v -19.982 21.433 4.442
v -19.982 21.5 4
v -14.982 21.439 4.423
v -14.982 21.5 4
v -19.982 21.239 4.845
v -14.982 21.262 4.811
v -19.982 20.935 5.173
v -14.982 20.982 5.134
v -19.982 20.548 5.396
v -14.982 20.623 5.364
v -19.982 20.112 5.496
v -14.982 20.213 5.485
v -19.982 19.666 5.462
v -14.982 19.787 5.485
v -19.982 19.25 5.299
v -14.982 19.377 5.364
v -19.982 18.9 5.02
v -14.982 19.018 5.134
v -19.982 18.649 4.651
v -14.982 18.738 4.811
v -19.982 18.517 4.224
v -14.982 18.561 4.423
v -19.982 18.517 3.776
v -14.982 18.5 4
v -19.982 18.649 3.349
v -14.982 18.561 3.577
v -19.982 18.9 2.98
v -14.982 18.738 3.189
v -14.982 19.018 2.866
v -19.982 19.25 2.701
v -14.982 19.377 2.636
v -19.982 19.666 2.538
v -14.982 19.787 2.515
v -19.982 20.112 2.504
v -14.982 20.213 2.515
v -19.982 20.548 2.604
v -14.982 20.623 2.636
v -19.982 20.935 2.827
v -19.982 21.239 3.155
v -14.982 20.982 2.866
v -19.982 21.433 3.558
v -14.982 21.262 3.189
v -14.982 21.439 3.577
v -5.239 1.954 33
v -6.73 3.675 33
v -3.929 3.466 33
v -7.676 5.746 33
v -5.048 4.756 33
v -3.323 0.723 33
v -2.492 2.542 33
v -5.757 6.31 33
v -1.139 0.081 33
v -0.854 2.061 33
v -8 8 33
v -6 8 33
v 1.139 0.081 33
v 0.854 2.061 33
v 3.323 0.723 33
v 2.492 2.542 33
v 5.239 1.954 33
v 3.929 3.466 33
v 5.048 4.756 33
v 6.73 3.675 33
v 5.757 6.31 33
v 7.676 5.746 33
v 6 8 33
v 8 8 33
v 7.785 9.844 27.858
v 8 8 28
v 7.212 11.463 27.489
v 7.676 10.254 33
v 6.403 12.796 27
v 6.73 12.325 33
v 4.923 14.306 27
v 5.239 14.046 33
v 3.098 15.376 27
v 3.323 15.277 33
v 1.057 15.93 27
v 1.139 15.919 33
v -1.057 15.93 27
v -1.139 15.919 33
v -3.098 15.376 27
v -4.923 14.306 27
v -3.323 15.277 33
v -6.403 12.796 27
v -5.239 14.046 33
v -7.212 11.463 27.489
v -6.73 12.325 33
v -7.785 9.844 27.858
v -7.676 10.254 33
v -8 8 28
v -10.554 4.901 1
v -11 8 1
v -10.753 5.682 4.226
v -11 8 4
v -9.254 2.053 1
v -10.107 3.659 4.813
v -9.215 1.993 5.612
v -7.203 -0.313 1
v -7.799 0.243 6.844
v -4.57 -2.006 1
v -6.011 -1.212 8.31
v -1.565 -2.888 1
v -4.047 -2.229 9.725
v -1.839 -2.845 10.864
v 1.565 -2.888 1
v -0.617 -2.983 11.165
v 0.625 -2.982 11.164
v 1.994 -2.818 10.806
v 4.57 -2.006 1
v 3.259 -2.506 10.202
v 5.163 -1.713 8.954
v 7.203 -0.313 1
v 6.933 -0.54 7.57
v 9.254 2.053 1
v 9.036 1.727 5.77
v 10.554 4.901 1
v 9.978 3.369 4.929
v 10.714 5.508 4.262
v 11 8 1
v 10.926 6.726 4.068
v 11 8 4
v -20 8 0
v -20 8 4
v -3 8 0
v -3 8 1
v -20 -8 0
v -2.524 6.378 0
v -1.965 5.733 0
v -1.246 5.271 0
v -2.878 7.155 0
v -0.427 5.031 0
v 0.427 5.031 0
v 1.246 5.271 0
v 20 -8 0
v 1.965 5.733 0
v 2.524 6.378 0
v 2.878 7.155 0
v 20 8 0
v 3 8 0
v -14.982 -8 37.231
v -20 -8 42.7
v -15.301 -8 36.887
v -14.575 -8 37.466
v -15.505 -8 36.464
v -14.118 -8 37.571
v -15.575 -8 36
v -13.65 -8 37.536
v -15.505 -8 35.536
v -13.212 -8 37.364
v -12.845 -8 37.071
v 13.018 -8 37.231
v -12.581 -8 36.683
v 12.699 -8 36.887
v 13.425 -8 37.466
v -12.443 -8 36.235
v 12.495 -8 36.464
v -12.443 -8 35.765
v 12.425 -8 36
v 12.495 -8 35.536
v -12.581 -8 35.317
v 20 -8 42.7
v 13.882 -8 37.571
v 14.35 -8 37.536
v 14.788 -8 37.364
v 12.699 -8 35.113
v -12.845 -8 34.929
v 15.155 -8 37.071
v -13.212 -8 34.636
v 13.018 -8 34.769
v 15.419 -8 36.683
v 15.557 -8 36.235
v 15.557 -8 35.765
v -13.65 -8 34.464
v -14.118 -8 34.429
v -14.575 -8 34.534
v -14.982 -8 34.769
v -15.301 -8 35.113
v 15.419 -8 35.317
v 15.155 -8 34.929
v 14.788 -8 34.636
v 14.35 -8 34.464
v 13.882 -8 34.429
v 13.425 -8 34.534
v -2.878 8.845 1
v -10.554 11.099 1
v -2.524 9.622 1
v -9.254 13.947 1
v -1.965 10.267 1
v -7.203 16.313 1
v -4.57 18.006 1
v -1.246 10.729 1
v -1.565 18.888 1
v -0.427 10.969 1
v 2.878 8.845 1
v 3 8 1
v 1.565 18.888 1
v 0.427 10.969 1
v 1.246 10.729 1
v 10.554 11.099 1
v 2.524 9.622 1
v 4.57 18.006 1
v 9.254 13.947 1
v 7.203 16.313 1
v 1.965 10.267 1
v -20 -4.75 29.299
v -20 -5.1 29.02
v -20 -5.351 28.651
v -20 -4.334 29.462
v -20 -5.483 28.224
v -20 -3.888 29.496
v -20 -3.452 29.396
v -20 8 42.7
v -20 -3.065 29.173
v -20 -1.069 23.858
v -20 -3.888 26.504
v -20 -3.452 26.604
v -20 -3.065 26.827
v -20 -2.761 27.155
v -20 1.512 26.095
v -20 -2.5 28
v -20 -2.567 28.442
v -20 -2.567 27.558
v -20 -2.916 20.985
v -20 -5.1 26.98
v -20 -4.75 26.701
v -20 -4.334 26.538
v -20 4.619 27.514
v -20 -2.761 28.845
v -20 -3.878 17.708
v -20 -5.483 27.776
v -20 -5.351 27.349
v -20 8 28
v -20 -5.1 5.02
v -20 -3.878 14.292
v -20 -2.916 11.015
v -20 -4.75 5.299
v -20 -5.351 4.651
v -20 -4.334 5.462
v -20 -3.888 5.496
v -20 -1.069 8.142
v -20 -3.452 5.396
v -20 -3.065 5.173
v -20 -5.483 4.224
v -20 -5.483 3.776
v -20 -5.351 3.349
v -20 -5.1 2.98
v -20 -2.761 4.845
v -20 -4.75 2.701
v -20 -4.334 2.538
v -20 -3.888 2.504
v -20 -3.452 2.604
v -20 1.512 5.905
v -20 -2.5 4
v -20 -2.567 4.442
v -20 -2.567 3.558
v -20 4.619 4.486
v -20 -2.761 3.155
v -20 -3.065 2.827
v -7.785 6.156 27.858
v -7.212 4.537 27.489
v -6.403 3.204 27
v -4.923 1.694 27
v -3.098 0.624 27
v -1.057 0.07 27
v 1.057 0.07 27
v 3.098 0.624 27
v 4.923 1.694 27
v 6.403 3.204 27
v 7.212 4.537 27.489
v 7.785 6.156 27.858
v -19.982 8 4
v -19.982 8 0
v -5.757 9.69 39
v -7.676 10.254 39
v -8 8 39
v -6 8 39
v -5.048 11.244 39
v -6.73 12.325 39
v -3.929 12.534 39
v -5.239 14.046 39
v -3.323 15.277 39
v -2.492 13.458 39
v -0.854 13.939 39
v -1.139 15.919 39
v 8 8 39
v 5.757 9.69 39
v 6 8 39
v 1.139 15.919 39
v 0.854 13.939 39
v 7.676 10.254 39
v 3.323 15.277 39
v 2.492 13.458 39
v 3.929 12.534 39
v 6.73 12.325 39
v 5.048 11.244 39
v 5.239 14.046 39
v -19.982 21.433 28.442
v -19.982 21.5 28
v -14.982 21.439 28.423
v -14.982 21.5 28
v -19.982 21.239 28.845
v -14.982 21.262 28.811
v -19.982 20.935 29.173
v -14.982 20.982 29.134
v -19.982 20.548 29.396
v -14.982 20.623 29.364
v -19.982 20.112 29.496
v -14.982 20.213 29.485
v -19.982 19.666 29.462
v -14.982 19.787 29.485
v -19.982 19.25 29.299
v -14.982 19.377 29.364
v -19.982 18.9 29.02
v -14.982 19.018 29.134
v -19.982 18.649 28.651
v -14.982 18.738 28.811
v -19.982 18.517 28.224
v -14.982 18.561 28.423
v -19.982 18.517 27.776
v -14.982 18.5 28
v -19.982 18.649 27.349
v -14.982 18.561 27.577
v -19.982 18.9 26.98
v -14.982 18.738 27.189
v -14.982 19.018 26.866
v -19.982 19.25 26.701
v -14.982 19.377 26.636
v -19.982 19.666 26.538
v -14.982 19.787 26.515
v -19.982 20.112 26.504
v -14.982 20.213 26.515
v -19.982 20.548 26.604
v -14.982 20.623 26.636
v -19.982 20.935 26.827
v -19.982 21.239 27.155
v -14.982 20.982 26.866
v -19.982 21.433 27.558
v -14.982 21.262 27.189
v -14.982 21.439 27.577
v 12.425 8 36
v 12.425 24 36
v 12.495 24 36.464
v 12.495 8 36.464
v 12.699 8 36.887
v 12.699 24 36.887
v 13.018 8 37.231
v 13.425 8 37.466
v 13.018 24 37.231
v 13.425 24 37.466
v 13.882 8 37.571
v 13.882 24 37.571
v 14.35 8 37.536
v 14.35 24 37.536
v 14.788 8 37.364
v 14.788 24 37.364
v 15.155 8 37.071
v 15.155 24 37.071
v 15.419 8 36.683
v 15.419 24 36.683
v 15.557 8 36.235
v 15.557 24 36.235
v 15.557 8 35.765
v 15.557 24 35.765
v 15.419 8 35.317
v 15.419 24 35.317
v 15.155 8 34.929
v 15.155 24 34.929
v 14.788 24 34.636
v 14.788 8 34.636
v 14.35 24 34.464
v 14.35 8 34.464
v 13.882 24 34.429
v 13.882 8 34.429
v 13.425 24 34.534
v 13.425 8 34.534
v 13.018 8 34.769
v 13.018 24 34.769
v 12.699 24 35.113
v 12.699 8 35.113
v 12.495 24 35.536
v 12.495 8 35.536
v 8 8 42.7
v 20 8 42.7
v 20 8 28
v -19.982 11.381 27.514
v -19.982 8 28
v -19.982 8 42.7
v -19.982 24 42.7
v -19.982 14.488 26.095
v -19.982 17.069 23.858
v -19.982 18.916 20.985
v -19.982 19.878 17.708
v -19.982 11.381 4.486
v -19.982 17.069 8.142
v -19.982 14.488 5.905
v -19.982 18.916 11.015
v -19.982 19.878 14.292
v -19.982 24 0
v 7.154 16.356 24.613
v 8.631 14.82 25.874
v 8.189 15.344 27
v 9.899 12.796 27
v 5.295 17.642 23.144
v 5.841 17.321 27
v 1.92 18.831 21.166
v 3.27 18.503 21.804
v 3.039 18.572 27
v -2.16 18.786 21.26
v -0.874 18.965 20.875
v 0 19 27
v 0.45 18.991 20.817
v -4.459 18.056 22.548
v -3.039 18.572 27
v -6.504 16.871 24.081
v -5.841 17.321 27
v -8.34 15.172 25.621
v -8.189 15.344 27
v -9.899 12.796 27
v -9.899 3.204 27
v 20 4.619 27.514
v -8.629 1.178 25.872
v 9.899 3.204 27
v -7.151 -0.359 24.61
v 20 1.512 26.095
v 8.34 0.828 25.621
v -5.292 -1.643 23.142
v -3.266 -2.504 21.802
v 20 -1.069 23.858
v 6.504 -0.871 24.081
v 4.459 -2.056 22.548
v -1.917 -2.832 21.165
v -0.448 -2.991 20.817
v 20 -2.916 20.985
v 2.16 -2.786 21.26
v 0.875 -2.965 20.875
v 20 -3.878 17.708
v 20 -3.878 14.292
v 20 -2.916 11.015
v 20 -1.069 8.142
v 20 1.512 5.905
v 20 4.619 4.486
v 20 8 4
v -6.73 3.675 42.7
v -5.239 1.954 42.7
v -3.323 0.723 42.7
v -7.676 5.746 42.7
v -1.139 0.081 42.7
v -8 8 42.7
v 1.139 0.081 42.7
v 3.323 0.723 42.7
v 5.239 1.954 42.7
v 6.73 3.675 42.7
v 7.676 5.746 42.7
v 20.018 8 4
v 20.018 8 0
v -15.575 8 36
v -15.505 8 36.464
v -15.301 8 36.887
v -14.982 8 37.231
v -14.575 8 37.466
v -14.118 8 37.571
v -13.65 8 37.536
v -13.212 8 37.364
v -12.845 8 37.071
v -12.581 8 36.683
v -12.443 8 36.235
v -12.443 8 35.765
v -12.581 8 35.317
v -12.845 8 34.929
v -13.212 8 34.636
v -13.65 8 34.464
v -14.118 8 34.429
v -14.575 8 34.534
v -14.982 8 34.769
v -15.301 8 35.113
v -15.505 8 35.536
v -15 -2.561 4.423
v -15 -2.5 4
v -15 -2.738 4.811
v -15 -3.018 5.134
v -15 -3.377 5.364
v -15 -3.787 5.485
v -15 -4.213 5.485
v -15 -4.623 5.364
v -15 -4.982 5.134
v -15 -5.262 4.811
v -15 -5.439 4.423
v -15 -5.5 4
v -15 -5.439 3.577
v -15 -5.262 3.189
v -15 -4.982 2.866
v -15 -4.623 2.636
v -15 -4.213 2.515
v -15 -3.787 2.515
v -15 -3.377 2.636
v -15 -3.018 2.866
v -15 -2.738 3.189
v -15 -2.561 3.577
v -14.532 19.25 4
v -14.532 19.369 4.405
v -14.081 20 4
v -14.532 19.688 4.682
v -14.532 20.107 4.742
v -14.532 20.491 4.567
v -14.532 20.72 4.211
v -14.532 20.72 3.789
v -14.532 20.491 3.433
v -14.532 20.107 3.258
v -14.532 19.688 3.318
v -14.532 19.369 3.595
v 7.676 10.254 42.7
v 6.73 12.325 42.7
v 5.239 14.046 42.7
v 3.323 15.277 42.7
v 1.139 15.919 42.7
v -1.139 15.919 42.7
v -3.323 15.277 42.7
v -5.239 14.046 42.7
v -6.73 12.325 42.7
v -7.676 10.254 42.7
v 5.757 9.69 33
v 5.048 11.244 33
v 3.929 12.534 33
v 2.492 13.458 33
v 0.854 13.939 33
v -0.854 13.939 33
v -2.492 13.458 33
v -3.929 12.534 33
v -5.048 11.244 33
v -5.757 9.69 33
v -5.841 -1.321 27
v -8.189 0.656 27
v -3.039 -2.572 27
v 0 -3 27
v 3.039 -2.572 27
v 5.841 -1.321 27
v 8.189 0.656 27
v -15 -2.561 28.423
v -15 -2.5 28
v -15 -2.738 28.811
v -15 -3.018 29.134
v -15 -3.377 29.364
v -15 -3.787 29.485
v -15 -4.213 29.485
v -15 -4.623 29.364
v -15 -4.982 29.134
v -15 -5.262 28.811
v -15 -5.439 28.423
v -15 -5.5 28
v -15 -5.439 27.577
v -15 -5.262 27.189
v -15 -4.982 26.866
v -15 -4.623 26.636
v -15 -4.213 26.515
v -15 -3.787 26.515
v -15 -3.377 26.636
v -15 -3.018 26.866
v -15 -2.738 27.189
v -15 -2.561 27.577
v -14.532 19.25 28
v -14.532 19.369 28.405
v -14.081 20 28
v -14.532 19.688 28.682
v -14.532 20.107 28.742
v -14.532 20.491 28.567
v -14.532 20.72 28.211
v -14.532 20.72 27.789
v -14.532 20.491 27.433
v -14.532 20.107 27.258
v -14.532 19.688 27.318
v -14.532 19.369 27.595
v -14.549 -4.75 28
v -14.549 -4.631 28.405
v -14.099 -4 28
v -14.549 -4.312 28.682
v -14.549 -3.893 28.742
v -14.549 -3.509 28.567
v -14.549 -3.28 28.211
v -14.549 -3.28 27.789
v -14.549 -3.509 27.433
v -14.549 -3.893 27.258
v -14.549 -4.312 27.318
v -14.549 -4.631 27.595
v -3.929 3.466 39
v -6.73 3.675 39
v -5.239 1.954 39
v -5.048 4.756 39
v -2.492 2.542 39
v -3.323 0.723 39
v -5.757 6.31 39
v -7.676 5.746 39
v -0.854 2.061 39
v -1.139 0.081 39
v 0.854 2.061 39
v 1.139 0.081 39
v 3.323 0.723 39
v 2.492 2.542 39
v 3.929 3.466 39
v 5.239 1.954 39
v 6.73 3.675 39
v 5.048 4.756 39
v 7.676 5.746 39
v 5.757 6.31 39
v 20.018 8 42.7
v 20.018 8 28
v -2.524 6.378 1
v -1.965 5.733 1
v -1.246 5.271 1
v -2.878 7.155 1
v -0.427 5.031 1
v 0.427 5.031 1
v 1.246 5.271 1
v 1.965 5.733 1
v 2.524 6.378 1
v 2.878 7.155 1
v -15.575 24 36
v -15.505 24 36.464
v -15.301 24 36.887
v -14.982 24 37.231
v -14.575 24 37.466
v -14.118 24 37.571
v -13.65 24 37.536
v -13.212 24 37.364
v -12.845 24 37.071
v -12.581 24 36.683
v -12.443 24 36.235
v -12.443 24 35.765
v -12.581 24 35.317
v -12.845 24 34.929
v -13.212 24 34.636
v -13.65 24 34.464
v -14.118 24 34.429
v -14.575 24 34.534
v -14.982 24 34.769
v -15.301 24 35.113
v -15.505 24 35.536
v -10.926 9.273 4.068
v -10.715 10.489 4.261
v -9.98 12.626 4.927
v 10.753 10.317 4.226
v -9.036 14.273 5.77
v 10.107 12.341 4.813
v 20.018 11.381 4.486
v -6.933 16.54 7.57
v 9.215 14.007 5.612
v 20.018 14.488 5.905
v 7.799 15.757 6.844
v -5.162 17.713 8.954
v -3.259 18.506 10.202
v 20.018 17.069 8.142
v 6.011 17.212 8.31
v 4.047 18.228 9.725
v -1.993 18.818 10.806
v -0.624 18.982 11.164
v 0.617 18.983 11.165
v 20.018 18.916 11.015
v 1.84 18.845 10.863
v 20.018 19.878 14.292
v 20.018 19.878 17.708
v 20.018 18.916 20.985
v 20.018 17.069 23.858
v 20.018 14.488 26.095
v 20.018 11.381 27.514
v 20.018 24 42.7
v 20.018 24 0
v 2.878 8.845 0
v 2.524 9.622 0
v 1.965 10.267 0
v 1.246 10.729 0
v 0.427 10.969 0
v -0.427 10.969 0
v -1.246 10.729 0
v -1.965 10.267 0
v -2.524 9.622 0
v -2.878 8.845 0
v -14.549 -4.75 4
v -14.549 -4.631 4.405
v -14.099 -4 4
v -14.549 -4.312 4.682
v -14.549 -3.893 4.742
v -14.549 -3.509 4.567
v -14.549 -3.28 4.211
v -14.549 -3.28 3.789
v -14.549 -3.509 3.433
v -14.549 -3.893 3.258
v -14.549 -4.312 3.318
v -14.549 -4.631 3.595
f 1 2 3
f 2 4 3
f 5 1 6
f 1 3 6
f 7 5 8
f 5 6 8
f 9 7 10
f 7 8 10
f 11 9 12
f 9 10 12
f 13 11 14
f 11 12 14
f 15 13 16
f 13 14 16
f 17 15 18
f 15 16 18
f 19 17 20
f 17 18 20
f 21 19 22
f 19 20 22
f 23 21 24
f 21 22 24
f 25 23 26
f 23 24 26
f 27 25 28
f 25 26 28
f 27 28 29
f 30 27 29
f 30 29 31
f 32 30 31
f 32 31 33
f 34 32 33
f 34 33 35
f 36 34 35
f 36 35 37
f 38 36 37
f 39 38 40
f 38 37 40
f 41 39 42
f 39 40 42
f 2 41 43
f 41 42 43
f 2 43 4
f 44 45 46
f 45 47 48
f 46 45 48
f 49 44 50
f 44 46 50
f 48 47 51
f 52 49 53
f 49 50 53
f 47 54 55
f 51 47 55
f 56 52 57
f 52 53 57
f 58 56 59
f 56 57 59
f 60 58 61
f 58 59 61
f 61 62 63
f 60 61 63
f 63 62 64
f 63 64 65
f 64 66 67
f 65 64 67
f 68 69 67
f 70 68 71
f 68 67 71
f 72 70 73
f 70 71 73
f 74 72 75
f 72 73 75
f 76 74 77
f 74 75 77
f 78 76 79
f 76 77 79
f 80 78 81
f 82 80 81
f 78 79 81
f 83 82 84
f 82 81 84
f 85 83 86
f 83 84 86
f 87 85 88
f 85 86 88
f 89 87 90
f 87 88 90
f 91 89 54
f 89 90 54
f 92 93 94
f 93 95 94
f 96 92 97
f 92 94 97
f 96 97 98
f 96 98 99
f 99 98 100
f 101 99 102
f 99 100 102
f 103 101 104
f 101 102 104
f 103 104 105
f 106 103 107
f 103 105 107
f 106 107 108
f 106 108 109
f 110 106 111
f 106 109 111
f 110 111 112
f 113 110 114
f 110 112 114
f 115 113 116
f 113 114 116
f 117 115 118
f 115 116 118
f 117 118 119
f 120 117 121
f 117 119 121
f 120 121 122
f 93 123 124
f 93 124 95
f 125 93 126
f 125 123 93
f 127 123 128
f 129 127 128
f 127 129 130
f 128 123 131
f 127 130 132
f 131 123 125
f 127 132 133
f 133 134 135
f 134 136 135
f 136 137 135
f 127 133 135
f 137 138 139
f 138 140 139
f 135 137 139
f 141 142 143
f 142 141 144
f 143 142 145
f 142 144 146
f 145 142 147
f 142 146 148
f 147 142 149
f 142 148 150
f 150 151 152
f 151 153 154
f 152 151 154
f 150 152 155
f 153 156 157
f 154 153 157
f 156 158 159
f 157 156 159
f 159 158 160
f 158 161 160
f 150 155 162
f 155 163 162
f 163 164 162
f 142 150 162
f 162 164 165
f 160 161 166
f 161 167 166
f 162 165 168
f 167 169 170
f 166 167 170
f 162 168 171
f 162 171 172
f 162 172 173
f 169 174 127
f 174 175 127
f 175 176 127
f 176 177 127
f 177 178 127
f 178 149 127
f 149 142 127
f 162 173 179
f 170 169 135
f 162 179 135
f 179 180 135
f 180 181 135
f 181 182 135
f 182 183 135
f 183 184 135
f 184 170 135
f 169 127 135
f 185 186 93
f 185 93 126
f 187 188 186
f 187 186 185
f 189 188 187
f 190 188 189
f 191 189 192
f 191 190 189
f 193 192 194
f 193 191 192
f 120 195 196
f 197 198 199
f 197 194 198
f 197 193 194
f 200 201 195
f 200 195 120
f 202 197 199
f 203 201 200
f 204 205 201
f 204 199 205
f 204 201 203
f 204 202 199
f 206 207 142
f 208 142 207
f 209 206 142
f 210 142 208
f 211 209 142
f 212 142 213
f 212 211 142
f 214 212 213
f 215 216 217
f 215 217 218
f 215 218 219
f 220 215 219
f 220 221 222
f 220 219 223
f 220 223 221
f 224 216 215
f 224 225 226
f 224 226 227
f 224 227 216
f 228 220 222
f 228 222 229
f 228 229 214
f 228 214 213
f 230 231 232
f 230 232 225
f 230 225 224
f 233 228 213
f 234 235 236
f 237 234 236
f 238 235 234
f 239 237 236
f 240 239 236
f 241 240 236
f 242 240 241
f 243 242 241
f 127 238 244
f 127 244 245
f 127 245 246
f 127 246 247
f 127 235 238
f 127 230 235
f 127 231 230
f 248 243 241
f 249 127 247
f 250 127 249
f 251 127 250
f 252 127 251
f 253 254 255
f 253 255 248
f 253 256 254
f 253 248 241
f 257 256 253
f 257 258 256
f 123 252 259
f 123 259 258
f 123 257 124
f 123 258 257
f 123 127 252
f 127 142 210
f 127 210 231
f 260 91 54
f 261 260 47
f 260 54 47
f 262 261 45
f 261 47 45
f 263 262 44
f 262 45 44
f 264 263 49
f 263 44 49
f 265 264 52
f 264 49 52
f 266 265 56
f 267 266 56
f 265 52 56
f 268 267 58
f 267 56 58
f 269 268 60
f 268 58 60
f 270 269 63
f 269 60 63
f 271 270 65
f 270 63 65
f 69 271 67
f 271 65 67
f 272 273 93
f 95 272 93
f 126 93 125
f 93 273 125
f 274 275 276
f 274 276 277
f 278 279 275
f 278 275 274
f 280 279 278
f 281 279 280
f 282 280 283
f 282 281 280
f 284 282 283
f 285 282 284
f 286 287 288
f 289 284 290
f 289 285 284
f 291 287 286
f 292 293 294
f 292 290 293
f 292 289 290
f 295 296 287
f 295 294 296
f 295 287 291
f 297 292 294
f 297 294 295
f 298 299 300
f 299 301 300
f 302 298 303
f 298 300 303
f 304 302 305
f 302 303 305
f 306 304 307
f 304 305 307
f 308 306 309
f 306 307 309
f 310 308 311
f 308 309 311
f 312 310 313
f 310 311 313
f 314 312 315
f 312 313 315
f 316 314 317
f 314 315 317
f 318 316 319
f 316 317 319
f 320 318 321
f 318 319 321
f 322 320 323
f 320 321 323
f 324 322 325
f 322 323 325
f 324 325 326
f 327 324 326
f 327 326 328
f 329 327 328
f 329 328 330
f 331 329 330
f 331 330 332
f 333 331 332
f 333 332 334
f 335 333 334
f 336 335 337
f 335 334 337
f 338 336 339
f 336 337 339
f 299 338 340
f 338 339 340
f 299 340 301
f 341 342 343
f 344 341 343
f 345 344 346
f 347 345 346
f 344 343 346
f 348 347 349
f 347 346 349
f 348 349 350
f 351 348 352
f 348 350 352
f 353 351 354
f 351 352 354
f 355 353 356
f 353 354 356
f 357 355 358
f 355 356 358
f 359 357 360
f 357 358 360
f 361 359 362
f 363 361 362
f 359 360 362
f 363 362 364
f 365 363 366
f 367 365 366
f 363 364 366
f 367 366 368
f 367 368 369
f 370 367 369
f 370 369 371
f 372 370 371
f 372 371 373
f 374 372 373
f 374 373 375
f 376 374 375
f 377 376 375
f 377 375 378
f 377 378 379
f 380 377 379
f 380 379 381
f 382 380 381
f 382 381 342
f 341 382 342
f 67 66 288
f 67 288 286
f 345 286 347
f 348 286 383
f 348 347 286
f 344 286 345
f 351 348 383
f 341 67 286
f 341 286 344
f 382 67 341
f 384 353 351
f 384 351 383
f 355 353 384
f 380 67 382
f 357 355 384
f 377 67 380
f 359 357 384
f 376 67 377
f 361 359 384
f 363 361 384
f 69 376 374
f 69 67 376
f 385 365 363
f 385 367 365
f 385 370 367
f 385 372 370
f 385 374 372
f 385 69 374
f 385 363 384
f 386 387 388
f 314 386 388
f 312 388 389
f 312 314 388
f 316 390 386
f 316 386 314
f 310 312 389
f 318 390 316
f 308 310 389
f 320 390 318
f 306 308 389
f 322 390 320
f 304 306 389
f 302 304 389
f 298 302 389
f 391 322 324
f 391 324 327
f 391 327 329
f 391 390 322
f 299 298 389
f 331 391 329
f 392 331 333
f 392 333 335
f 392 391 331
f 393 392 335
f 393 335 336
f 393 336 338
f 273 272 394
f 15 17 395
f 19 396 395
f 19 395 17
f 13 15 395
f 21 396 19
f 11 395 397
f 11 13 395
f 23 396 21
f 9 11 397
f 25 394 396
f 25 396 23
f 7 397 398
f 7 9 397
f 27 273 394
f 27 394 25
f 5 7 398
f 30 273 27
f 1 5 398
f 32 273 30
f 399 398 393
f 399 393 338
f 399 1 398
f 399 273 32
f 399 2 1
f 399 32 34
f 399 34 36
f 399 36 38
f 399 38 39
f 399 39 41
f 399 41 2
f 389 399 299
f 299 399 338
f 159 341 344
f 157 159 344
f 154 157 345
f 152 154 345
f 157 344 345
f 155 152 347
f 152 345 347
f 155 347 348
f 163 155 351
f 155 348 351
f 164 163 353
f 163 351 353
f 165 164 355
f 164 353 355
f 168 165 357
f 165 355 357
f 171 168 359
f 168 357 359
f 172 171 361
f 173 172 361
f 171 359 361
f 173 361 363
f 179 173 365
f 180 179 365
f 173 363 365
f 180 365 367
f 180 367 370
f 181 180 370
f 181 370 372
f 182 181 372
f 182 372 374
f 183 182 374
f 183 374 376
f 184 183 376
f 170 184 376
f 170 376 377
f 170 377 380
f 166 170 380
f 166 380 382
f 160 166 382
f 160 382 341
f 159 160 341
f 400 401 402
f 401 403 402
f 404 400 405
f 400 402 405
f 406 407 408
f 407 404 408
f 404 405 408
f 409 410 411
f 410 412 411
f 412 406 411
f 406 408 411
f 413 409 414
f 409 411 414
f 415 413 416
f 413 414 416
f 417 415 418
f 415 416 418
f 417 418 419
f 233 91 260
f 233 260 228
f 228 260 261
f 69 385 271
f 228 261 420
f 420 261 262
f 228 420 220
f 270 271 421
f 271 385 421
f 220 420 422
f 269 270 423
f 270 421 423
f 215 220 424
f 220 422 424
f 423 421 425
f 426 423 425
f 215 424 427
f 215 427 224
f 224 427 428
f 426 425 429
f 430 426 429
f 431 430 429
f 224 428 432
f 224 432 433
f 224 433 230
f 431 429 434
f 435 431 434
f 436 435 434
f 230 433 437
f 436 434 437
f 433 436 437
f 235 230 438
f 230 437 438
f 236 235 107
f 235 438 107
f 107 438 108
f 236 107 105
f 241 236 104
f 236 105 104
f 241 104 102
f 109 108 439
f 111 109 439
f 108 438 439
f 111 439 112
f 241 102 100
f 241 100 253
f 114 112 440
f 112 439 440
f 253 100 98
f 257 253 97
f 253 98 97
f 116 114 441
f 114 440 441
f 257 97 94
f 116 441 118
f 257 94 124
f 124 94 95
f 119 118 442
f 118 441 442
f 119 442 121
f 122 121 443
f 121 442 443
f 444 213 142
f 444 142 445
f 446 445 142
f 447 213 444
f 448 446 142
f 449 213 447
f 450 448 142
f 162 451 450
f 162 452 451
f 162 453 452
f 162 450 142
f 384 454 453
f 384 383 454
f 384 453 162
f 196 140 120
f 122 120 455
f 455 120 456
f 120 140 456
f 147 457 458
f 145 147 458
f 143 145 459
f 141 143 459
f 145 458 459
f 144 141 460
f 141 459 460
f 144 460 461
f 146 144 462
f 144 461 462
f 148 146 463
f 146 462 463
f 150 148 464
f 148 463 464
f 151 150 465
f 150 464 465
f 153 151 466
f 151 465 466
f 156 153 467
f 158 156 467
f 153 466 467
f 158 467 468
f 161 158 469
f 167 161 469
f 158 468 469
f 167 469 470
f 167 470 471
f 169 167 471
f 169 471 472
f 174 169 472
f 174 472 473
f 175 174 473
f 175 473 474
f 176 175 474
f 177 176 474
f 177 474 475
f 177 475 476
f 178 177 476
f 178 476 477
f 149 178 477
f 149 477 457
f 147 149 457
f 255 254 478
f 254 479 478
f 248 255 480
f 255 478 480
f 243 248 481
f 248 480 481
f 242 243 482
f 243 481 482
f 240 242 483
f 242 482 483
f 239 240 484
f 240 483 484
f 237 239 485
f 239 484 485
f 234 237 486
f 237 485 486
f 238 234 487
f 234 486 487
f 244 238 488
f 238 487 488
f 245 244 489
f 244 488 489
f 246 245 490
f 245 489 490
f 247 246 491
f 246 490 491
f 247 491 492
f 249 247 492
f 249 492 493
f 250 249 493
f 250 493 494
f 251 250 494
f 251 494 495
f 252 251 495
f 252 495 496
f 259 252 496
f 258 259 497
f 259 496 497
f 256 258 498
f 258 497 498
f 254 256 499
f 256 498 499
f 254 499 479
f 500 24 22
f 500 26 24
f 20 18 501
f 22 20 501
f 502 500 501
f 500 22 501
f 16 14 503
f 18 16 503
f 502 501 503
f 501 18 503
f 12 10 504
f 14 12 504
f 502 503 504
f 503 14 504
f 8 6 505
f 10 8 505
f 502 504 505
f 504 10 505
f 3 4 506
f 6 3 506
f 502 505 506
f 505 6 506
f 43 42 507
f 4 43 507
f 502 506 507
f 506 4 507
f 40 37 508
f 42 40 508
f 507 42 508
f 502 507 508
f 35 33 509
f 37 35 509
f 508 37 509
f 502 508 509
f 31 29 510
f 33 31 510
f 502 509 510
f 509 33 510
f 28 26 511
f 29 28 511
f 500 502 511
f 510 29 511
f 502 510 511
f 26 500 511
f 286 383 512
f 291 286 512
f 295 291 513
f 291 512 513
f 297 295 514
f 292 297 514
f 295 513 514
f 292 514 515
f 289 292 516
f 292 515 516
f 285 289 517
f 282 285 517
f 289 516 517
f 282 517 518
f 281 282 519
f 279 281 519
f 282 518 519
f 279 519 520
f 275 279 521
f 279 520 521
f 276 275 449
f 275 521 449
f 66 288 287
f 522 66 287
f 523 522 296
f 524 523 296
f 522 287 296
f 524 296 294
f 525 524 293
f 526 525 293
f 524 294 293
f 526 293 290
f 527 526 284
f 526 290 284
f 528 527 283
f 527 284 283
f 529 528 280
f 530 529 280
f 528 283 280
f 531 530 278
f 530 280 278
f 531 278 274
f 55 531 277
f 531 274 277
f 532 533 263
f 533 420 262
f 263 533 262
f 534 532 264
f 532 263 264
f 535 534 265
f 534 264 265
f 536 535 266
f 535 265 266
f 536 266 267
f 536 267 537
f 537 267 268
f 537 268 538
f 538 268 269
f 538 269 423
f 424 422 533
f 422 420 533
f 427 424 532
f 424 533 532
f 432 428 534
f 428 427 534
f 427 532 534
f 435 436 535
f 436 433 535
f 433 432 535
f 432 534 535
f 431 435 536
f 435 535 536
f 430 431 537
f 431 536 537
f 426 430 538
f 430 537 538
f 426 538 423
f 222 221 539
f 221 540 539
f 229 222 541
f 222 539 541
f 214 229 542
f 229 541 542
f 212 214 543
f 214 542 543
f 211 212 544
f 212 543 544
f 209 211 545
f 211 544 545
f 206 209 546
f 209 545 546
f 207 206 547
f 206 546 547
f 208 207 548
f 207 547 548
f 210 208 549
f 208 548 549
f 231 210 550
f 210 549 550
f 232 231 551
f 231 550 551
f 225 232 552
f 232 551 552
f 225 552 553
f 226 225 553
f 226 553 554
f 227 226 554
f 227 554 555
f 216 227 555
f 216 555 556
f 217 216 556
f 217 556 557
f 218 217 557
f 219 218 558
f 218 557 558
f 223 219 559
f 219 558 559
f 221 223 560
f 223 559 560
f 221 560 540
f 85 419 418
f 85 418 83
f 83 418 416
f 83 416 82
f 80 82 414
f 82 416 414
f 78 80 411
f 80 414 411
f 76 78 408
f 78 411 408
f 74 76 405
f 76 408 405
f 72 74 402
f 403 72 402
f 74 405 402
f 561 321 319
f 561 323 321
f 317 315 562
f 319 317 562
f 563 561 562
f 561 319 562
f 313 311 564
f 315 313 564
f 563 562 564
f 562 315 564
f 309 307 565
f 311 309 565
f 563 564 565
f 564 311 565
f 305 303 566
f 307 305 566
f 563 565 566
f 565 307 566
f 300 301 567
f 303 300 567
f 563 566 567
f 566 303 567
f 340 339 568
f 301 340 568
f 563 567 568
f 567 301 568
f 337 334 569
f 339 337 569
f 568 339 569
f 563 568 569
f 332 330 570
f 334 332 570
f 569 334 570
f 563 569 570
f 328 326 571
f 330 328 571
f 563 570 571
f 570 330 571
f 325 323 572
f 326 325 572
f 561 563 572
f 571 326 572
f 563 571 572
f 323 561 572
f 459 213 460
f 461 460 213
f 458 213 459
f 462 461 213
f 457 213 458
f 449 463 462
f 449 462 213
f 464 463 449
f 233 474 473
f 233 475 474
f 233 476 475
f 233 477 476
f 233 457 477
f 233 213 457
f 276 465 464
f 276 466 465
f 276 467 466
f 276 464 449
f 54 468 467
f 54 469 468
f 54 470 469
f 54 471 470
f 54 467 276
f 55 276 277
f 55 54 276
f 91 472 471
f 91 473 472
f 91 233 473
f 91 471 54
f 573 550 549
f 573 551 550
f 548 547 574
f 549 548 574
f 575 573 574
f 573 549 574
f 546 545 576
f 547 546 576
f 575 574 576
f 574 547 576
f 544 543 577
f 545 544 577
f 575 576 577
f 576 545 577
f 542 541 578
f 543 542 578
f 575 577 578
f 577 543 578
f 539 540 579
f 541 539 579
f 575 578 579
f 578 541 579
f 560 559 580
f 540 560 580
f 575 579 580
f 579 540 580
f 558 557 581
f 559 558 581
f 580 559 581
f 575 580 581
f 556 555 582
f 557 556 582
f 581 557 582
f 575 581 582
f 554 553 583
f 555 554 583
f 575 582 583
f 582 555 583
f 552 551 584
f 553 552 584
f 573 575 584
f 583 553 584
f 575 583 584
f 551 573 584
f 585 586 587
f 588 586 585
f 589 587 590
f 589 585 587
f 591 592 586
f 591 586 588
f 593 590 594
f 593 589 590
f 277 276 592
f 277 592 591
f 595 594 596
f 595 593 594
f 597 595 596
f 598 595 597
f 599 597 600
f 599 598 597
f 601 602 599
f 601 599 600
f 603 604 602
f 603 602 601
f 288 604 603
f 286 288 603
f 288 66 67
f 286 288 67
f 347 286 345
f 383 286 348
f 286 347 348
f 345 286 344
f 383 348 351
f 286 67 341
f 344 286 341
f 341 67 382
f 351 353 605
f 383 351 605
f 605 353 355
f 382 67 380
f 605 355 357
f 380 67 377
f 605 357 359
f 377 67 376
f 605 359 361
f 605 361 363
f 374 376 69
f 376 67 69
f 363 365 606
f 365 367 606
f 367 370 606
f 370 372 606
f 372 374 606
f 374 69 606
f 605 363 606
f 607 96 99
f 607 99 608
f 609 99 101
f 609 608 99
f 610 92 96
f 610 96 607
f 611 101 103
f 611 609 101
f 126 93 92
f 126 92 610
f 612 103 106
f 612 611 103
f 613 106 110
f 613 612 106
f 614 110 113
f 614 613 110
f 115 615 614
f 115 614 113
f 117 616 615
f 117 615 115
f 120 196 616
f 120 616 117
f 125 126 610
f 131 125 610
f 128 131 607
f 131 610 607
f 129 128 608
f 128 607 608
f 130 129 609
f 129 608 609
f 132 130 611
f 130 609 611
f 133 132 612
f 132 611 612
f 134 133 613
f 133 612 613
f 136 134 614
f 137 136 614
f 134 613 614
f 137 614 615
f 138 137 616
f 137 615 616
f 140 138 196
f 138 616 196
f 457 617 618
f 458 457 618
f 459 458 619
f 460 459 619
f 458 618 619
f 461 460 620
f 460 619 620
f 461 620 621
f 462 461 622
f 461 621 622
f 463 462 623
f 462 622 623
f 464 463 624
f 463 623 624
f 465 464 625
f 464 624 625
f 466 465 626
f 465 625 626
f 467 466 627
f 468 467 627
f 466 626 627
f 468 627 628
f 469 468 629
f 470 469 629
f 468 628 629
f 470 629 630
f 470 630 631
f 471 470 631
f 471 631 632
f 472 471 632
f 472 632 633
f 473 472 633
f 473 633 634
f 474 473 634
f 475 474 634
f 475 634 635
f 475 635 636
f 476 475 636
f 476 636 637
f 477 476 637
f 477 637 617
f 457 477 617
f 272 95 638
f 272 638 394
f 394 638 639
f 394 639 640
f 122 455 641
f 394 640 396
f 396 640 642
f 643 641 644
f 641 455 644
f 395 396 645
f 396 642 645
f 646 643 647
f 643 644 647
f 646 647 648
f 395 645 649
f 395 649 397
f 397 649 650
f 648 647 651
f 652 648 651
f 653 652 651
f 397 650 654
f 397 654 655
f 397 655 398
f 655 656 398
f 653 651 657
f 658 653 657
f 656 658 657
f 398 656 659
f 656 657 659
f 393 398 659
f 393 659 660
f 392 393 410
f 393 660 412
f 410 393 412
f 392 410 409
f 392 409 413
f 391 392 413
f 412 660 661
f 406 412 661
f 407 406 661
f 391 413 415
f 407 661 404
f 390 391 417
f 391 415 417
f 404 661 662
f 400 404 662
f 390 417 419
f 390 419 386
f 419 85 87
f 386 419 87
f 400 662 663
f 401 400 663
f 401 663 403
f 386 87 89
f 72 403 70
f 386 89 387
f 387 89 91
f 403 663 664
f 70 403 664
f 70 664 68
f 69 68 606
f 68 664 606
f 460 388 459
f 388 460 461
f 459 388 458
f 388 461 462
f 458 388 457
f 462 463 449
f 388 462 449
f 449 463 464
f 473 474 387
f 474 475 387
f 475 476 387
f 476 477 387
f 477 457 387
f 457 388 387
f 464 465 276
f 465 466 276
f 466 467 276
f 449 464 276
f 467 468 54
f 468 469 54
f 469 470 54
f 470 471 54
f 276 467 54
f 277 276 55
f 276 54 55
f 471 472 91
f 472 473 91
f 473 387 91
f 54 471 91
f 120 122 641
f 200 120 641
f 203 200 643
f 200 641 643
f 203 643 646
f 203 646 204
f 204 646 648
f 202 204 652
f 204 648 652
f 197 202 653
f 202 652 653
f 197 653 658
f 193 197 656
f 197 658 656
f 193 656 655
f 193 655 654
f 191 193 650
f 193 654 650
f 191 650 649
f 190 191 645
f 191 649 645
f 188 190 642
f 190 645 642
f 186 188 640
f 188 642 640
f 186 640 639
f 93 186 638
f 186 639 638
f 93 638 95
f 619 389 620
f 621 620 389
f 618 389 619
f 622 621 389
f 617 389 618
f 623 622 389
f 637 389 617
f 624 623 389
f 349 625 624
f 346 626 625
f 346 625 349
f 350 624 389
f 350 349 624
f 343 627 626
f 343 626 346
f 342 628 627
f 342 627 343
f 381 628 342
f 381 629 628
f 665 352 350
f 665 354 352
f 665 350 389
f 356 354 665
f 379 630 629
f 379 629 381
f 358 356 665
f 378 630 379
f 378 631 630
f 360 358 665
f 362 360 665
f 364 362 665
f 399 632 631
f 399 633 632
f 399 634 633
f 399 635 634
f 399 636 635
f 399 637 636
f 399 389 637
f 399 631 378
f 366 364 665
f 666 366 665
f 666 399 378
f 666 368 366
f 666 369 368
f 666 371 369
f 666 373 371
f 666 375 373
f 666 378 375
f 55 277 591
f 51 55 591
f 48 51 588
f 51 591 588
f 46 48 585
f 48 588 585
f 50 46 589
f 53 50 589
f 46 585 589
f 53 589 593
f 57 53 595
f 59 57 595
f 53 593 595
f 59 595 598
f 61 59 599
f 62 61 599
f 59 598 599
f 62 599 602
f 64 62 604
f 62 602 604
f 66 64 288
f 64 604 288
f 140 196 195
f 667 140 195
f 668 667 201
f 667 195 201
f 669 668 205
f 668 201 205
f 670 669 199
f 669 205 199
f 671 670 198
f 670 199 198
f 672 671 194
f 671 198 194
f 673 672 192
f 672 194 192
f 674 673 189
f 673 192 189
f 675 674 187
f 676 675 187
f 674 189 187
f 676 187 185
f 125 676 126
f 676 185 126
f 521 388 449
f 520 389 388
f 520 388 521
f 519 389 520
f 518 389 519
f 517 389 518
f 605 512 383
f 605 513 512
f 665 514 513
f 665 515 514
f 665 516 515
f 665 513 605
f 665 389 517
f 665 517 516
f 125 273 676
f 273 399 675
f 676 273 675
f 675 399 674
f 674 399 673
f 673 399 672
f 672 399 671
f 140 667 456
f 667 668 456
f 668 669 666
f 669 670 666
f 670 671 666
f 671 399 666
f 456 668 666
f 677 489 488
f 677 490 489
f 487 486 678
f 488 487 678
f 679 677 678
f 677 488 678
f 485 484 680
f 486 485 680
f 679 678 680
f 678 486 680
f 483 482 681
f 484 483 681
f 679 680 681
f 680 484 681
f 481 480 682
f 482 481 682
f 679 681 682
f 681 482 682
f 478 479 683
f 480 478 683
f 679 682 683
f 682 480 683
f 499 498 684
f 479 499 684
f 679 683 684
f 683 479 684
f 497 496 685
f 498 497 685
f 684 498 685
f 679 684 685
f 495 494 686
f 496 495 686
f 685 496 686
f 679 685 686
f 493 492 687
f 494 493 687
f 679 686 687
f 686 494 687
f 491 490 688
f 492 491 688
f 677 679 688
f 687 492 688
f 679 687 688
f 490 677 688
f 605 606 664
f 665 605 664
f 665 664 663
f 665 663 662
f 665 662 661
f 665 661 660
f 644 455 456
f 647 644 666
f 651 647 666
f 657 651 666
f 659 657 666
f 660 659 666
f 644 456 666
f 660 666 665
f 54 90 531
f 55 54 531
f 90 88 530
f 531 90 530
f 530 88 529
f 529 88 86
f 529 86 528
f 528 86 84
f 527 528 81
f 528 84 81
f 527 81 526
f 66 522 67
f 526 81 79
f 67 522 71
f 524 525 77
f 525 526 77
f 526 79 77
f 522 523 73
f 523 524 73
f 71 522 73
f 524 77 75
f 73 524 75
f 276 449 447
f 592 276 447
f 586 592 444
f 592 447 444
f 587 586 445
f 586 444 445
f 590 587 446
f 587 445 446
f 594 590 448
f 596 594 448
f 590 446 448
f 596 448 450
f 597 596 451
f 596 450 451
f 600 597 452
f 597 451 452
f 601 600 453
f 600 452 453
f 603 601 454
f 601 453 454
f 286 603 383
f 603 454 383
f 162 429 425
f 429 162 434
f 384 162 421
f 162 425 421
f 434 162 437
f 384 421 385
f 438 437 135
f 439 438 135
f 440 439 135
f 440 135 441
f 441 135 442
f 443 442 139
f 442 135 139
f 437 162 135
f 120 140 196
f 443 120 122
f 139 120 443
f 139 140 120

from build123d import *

# Parameters (mm, degrees)
F0_W      = 40
F0_H      = 16
F2_DEPTH  = 42.7
F1_W      = 40
F1_H      = 16
F3_DEPTH  = 42.7
F5_DEPTH  = 3.7
F6_R      = 6
F7_DEPTH  = 6
F8_R      = 8
F9_DEPTH  = 6
F10_R     = 11
F11_DEPTH = 26
F12_R     = 3
F13_DEPTH = 1
F16_D     = 3
F16_DEPTH = 5
F16_TIP   = 0.9012909285
F18_D     = 3
F18_DEPTH = 5
F18_TIP   = 0.9012909285
F20_D     = 3
F20_DEPTH = 5
F20_TIP   = 0.9012909285
F22_D     = 3
F22_DEPTH = 5
F22_TIP   = 0.9012909285
F24_D     = 3.15
F24_2_D   = 3.15
F26_D     = 3.15
F26_2_D   = 3.15
F28_D     = 24
F28_2_D   = 24


with BuildPart() as f2:
    # F0 (on Top) → F2 (new body)
    with BuildSketch(Plane.XY):
        Rectangle(F0_W, F0_H)
    extrude(amount=F2_DEPTH)


with BuildPart() as f3:
    # F1 (on face) → F3 (new body)
    with BuildSketch(Plane.XY):
        with Locations((0.0176080316, 16)):
            Rectangle(F1_W, F1_H)
    extrude(amount=F3_DEPTH)


with BuildPart() as f5_tool:
    # F4 (on face) → F5 (new body)
    with BuildSketch(Plane.XY.offset(42.7)):
        with BuildLine():
            ThreePointArc((-8, 8), (0, 0), (8, 8))
            Line((8, 8), (-8, 8))
        make_face()
        with BuildLine():
            Line((-8, 8), (8, 8))
            ThreePointArc((8, 8), (0, 16), (-8, 8))
        make_face()
    extrude(amount=-F5_DEPTH)


with BuildPart() as f2_1:
    add(f2.part)

    # F5: cut by f5_tool
    add(f5_tool.part, mode=Mode.SUBTRACT)


with BuildPart() as f3_1:
    add(f3.part)

    # F5: cut by f5_tool
    add(f5_tool.part, mode=Mode.SUBTRACT)


with BuildPart() as f7_tool:
    # F6 (on face) → F7 (new body)
    with BuildSketch(Plane.XY.offset(39)):
        with Locations((0, 8)):
            Circle(F6_R)
    extrude(amount=-F7_DEPTH)


with BuildPart() as f2_2:
    add(f2_1.part)

    # F7: cut by f7_tool
    add(f7_tool.part, mode=Mode.SUBTRACT)


with BuildPart() as f3_2:
    add(f3_1.part)

    # F7: cut by f7_tool
    add(f7_tool.part, mode=Mode.SUBTRACT)


with BuildPart() as f9_tool:
    # F8 (on face) → F9 (new body)
    with BuildSketch(Plane.XY.offset(33)):
        with Locations((0, 8)):
            Circle(F8_R)
    extrude(amount=-F9_DEPTH)


with BuildPart() as f2_3:
    add(f2_2.part)

    # F9: cut by f9_tool
    add(f9_tool.part, mode=Mode.SUBTRACT)


with BuildPart() as f3_3:
    add(f3_2.part)

    # F9: cut by f9_tool
    add(f9_tool.part, mode=Mode.SUBTRACT)


with BuildPart() as f11_tool:
    # F10 (on face) → F11 (new body)
    with BuildSketch(Plane.XY.offset(27)):
        with Locations((0, 8)):
            Circle(F10_R)
    extrude(amount=-F11_DEPTH)


with BuildPart() as f2_4:
    add(f2_3.part)

    # F11: cut by f11_tool
    add(f11_tool.part, mode=Mode.SUBTRACT)


with BuildPart() as f3_4:
    add(f3_3.part)

    # F11: cut by f11_tool
    add(f11_tool.part, mode=Mode.SUBTRACT)


with BuildPart() as f13_tool:
    # F12 (on face) → F13 (new body)
    with BuildSketch(Plane.XY.offset(1)):
        with Locations((0, 8)):
            Circle(F12_R)
    extrude(amount=-F13_DEPTH)


with BuildPart() as f2_5:
    add(f2_4.part)

    # F13: cut by f13_tool
    add(f13_tool.part, mode=Mode.SUBTRACT)

    # F16
    with Locations(Plane(origin=(-20, 0, 0), x_dir=(0, -1, 0), z_dir=(-1, 0, 0))):
        with Locations((4, 4)):
            Hole(F16_D / 2, depth=F16_DEPTH)
            with Locations((0, 0, -(F16_DEPTH + F16_TIP / 2))):  # 118° drill point
                Cone(0, F16_D / 2, F16_TIP, mode=Mode.SUBTRACT)

    # F20
    with Locations(Plane(origin=(-20, 0, 0), x_dir=(0, -1, 0), z_dir=(-1, 0, 0))):
        with Locations((4, 28)):
            Hole(F20_D / 2, depth=F20_DEPTH)
            with Locations((0, 0, -(F20_DEPTH + F20_TIP / 2))):  # 118° drill point
                Cone(0, F20_D / 2, F20_TIP, mode=Mode.SUBTRACT)

    # F24 (through all)
    with Locations(Plane.XZ.offset(8)):
        with Locations((-14, 36)):
            Hole(F24_D / 2)

    # F26 (through all)
    with Locations(Plane.XZ.offset(8)):
        with Locations((14, 36)):
            Hole(F26_D / 2)

    # F28 (through all)
    with Locations(Plane(origin=(-20, 0, 0), x_dir=(0, -1, 0), z_dir=(-1, 0, 0))):
        with Locations((-8, 16)):
            Hole(F28_D / 2)


with BuildPart() as f3_5:
    add(f3_4.part)

    # F13: cut by f13_tool
    add(f13_tool.part, mode=Mode.SUBTRACT)

    # F18
    with Locations(Plane(origin=(-19.9823919684, 0, 0), x_dir=(0, -1, 0), z_dir=(-1, 0, 0))):
        with Locations((-20, 4)):
            Hole(F18_D / 2, depth=F18_DEPTH)
            with Locations((0, 0, -(F18_DEPTH + F18_TIP / 2))):  # 118° drill point
                Cone(0, F18_D / 2, F18_TIP, mode=Mode.SUBTRACT)

    # F22
    with Locations(Plane(origin=(-19.9823919684, 0, 0), x_dir=(0, -1, 0), z_dir=(-1, 0, 0))):
        with Locations((-20, 28)):
            Hole(F22_D / 2, depth=F22_DEPTH)
            with Locations((0, 0, -(F22_DEPTH + F22_TIP / 2))):  # 118° drill point
                Cone(0, F22_D / 2, F22_TIP, mode=Mode.SUBTRACT)

    # F24#2 (through all)
    with Locations(Plane.XZ.offset(8)):
        with Locations((-14, 36)):
            Hole(F24_2_D / 2)

    # F26#2 (through all)
    with Locations(Plane.XZ.offset(8)):
        with Locations((14, 36)):
            Hole(F26_2_D / 2)

    # F28#2 (through all)
    with Locations(Plane(origin=(-20, 0, 0), x_dir=(0, -1, 0), z_dir=(-1, 0, 0))):
        with Locations((-8, 16)):
            Hole(F28_2_D / 2)


solid = Compound([f2_5.part, f3_5.part])
